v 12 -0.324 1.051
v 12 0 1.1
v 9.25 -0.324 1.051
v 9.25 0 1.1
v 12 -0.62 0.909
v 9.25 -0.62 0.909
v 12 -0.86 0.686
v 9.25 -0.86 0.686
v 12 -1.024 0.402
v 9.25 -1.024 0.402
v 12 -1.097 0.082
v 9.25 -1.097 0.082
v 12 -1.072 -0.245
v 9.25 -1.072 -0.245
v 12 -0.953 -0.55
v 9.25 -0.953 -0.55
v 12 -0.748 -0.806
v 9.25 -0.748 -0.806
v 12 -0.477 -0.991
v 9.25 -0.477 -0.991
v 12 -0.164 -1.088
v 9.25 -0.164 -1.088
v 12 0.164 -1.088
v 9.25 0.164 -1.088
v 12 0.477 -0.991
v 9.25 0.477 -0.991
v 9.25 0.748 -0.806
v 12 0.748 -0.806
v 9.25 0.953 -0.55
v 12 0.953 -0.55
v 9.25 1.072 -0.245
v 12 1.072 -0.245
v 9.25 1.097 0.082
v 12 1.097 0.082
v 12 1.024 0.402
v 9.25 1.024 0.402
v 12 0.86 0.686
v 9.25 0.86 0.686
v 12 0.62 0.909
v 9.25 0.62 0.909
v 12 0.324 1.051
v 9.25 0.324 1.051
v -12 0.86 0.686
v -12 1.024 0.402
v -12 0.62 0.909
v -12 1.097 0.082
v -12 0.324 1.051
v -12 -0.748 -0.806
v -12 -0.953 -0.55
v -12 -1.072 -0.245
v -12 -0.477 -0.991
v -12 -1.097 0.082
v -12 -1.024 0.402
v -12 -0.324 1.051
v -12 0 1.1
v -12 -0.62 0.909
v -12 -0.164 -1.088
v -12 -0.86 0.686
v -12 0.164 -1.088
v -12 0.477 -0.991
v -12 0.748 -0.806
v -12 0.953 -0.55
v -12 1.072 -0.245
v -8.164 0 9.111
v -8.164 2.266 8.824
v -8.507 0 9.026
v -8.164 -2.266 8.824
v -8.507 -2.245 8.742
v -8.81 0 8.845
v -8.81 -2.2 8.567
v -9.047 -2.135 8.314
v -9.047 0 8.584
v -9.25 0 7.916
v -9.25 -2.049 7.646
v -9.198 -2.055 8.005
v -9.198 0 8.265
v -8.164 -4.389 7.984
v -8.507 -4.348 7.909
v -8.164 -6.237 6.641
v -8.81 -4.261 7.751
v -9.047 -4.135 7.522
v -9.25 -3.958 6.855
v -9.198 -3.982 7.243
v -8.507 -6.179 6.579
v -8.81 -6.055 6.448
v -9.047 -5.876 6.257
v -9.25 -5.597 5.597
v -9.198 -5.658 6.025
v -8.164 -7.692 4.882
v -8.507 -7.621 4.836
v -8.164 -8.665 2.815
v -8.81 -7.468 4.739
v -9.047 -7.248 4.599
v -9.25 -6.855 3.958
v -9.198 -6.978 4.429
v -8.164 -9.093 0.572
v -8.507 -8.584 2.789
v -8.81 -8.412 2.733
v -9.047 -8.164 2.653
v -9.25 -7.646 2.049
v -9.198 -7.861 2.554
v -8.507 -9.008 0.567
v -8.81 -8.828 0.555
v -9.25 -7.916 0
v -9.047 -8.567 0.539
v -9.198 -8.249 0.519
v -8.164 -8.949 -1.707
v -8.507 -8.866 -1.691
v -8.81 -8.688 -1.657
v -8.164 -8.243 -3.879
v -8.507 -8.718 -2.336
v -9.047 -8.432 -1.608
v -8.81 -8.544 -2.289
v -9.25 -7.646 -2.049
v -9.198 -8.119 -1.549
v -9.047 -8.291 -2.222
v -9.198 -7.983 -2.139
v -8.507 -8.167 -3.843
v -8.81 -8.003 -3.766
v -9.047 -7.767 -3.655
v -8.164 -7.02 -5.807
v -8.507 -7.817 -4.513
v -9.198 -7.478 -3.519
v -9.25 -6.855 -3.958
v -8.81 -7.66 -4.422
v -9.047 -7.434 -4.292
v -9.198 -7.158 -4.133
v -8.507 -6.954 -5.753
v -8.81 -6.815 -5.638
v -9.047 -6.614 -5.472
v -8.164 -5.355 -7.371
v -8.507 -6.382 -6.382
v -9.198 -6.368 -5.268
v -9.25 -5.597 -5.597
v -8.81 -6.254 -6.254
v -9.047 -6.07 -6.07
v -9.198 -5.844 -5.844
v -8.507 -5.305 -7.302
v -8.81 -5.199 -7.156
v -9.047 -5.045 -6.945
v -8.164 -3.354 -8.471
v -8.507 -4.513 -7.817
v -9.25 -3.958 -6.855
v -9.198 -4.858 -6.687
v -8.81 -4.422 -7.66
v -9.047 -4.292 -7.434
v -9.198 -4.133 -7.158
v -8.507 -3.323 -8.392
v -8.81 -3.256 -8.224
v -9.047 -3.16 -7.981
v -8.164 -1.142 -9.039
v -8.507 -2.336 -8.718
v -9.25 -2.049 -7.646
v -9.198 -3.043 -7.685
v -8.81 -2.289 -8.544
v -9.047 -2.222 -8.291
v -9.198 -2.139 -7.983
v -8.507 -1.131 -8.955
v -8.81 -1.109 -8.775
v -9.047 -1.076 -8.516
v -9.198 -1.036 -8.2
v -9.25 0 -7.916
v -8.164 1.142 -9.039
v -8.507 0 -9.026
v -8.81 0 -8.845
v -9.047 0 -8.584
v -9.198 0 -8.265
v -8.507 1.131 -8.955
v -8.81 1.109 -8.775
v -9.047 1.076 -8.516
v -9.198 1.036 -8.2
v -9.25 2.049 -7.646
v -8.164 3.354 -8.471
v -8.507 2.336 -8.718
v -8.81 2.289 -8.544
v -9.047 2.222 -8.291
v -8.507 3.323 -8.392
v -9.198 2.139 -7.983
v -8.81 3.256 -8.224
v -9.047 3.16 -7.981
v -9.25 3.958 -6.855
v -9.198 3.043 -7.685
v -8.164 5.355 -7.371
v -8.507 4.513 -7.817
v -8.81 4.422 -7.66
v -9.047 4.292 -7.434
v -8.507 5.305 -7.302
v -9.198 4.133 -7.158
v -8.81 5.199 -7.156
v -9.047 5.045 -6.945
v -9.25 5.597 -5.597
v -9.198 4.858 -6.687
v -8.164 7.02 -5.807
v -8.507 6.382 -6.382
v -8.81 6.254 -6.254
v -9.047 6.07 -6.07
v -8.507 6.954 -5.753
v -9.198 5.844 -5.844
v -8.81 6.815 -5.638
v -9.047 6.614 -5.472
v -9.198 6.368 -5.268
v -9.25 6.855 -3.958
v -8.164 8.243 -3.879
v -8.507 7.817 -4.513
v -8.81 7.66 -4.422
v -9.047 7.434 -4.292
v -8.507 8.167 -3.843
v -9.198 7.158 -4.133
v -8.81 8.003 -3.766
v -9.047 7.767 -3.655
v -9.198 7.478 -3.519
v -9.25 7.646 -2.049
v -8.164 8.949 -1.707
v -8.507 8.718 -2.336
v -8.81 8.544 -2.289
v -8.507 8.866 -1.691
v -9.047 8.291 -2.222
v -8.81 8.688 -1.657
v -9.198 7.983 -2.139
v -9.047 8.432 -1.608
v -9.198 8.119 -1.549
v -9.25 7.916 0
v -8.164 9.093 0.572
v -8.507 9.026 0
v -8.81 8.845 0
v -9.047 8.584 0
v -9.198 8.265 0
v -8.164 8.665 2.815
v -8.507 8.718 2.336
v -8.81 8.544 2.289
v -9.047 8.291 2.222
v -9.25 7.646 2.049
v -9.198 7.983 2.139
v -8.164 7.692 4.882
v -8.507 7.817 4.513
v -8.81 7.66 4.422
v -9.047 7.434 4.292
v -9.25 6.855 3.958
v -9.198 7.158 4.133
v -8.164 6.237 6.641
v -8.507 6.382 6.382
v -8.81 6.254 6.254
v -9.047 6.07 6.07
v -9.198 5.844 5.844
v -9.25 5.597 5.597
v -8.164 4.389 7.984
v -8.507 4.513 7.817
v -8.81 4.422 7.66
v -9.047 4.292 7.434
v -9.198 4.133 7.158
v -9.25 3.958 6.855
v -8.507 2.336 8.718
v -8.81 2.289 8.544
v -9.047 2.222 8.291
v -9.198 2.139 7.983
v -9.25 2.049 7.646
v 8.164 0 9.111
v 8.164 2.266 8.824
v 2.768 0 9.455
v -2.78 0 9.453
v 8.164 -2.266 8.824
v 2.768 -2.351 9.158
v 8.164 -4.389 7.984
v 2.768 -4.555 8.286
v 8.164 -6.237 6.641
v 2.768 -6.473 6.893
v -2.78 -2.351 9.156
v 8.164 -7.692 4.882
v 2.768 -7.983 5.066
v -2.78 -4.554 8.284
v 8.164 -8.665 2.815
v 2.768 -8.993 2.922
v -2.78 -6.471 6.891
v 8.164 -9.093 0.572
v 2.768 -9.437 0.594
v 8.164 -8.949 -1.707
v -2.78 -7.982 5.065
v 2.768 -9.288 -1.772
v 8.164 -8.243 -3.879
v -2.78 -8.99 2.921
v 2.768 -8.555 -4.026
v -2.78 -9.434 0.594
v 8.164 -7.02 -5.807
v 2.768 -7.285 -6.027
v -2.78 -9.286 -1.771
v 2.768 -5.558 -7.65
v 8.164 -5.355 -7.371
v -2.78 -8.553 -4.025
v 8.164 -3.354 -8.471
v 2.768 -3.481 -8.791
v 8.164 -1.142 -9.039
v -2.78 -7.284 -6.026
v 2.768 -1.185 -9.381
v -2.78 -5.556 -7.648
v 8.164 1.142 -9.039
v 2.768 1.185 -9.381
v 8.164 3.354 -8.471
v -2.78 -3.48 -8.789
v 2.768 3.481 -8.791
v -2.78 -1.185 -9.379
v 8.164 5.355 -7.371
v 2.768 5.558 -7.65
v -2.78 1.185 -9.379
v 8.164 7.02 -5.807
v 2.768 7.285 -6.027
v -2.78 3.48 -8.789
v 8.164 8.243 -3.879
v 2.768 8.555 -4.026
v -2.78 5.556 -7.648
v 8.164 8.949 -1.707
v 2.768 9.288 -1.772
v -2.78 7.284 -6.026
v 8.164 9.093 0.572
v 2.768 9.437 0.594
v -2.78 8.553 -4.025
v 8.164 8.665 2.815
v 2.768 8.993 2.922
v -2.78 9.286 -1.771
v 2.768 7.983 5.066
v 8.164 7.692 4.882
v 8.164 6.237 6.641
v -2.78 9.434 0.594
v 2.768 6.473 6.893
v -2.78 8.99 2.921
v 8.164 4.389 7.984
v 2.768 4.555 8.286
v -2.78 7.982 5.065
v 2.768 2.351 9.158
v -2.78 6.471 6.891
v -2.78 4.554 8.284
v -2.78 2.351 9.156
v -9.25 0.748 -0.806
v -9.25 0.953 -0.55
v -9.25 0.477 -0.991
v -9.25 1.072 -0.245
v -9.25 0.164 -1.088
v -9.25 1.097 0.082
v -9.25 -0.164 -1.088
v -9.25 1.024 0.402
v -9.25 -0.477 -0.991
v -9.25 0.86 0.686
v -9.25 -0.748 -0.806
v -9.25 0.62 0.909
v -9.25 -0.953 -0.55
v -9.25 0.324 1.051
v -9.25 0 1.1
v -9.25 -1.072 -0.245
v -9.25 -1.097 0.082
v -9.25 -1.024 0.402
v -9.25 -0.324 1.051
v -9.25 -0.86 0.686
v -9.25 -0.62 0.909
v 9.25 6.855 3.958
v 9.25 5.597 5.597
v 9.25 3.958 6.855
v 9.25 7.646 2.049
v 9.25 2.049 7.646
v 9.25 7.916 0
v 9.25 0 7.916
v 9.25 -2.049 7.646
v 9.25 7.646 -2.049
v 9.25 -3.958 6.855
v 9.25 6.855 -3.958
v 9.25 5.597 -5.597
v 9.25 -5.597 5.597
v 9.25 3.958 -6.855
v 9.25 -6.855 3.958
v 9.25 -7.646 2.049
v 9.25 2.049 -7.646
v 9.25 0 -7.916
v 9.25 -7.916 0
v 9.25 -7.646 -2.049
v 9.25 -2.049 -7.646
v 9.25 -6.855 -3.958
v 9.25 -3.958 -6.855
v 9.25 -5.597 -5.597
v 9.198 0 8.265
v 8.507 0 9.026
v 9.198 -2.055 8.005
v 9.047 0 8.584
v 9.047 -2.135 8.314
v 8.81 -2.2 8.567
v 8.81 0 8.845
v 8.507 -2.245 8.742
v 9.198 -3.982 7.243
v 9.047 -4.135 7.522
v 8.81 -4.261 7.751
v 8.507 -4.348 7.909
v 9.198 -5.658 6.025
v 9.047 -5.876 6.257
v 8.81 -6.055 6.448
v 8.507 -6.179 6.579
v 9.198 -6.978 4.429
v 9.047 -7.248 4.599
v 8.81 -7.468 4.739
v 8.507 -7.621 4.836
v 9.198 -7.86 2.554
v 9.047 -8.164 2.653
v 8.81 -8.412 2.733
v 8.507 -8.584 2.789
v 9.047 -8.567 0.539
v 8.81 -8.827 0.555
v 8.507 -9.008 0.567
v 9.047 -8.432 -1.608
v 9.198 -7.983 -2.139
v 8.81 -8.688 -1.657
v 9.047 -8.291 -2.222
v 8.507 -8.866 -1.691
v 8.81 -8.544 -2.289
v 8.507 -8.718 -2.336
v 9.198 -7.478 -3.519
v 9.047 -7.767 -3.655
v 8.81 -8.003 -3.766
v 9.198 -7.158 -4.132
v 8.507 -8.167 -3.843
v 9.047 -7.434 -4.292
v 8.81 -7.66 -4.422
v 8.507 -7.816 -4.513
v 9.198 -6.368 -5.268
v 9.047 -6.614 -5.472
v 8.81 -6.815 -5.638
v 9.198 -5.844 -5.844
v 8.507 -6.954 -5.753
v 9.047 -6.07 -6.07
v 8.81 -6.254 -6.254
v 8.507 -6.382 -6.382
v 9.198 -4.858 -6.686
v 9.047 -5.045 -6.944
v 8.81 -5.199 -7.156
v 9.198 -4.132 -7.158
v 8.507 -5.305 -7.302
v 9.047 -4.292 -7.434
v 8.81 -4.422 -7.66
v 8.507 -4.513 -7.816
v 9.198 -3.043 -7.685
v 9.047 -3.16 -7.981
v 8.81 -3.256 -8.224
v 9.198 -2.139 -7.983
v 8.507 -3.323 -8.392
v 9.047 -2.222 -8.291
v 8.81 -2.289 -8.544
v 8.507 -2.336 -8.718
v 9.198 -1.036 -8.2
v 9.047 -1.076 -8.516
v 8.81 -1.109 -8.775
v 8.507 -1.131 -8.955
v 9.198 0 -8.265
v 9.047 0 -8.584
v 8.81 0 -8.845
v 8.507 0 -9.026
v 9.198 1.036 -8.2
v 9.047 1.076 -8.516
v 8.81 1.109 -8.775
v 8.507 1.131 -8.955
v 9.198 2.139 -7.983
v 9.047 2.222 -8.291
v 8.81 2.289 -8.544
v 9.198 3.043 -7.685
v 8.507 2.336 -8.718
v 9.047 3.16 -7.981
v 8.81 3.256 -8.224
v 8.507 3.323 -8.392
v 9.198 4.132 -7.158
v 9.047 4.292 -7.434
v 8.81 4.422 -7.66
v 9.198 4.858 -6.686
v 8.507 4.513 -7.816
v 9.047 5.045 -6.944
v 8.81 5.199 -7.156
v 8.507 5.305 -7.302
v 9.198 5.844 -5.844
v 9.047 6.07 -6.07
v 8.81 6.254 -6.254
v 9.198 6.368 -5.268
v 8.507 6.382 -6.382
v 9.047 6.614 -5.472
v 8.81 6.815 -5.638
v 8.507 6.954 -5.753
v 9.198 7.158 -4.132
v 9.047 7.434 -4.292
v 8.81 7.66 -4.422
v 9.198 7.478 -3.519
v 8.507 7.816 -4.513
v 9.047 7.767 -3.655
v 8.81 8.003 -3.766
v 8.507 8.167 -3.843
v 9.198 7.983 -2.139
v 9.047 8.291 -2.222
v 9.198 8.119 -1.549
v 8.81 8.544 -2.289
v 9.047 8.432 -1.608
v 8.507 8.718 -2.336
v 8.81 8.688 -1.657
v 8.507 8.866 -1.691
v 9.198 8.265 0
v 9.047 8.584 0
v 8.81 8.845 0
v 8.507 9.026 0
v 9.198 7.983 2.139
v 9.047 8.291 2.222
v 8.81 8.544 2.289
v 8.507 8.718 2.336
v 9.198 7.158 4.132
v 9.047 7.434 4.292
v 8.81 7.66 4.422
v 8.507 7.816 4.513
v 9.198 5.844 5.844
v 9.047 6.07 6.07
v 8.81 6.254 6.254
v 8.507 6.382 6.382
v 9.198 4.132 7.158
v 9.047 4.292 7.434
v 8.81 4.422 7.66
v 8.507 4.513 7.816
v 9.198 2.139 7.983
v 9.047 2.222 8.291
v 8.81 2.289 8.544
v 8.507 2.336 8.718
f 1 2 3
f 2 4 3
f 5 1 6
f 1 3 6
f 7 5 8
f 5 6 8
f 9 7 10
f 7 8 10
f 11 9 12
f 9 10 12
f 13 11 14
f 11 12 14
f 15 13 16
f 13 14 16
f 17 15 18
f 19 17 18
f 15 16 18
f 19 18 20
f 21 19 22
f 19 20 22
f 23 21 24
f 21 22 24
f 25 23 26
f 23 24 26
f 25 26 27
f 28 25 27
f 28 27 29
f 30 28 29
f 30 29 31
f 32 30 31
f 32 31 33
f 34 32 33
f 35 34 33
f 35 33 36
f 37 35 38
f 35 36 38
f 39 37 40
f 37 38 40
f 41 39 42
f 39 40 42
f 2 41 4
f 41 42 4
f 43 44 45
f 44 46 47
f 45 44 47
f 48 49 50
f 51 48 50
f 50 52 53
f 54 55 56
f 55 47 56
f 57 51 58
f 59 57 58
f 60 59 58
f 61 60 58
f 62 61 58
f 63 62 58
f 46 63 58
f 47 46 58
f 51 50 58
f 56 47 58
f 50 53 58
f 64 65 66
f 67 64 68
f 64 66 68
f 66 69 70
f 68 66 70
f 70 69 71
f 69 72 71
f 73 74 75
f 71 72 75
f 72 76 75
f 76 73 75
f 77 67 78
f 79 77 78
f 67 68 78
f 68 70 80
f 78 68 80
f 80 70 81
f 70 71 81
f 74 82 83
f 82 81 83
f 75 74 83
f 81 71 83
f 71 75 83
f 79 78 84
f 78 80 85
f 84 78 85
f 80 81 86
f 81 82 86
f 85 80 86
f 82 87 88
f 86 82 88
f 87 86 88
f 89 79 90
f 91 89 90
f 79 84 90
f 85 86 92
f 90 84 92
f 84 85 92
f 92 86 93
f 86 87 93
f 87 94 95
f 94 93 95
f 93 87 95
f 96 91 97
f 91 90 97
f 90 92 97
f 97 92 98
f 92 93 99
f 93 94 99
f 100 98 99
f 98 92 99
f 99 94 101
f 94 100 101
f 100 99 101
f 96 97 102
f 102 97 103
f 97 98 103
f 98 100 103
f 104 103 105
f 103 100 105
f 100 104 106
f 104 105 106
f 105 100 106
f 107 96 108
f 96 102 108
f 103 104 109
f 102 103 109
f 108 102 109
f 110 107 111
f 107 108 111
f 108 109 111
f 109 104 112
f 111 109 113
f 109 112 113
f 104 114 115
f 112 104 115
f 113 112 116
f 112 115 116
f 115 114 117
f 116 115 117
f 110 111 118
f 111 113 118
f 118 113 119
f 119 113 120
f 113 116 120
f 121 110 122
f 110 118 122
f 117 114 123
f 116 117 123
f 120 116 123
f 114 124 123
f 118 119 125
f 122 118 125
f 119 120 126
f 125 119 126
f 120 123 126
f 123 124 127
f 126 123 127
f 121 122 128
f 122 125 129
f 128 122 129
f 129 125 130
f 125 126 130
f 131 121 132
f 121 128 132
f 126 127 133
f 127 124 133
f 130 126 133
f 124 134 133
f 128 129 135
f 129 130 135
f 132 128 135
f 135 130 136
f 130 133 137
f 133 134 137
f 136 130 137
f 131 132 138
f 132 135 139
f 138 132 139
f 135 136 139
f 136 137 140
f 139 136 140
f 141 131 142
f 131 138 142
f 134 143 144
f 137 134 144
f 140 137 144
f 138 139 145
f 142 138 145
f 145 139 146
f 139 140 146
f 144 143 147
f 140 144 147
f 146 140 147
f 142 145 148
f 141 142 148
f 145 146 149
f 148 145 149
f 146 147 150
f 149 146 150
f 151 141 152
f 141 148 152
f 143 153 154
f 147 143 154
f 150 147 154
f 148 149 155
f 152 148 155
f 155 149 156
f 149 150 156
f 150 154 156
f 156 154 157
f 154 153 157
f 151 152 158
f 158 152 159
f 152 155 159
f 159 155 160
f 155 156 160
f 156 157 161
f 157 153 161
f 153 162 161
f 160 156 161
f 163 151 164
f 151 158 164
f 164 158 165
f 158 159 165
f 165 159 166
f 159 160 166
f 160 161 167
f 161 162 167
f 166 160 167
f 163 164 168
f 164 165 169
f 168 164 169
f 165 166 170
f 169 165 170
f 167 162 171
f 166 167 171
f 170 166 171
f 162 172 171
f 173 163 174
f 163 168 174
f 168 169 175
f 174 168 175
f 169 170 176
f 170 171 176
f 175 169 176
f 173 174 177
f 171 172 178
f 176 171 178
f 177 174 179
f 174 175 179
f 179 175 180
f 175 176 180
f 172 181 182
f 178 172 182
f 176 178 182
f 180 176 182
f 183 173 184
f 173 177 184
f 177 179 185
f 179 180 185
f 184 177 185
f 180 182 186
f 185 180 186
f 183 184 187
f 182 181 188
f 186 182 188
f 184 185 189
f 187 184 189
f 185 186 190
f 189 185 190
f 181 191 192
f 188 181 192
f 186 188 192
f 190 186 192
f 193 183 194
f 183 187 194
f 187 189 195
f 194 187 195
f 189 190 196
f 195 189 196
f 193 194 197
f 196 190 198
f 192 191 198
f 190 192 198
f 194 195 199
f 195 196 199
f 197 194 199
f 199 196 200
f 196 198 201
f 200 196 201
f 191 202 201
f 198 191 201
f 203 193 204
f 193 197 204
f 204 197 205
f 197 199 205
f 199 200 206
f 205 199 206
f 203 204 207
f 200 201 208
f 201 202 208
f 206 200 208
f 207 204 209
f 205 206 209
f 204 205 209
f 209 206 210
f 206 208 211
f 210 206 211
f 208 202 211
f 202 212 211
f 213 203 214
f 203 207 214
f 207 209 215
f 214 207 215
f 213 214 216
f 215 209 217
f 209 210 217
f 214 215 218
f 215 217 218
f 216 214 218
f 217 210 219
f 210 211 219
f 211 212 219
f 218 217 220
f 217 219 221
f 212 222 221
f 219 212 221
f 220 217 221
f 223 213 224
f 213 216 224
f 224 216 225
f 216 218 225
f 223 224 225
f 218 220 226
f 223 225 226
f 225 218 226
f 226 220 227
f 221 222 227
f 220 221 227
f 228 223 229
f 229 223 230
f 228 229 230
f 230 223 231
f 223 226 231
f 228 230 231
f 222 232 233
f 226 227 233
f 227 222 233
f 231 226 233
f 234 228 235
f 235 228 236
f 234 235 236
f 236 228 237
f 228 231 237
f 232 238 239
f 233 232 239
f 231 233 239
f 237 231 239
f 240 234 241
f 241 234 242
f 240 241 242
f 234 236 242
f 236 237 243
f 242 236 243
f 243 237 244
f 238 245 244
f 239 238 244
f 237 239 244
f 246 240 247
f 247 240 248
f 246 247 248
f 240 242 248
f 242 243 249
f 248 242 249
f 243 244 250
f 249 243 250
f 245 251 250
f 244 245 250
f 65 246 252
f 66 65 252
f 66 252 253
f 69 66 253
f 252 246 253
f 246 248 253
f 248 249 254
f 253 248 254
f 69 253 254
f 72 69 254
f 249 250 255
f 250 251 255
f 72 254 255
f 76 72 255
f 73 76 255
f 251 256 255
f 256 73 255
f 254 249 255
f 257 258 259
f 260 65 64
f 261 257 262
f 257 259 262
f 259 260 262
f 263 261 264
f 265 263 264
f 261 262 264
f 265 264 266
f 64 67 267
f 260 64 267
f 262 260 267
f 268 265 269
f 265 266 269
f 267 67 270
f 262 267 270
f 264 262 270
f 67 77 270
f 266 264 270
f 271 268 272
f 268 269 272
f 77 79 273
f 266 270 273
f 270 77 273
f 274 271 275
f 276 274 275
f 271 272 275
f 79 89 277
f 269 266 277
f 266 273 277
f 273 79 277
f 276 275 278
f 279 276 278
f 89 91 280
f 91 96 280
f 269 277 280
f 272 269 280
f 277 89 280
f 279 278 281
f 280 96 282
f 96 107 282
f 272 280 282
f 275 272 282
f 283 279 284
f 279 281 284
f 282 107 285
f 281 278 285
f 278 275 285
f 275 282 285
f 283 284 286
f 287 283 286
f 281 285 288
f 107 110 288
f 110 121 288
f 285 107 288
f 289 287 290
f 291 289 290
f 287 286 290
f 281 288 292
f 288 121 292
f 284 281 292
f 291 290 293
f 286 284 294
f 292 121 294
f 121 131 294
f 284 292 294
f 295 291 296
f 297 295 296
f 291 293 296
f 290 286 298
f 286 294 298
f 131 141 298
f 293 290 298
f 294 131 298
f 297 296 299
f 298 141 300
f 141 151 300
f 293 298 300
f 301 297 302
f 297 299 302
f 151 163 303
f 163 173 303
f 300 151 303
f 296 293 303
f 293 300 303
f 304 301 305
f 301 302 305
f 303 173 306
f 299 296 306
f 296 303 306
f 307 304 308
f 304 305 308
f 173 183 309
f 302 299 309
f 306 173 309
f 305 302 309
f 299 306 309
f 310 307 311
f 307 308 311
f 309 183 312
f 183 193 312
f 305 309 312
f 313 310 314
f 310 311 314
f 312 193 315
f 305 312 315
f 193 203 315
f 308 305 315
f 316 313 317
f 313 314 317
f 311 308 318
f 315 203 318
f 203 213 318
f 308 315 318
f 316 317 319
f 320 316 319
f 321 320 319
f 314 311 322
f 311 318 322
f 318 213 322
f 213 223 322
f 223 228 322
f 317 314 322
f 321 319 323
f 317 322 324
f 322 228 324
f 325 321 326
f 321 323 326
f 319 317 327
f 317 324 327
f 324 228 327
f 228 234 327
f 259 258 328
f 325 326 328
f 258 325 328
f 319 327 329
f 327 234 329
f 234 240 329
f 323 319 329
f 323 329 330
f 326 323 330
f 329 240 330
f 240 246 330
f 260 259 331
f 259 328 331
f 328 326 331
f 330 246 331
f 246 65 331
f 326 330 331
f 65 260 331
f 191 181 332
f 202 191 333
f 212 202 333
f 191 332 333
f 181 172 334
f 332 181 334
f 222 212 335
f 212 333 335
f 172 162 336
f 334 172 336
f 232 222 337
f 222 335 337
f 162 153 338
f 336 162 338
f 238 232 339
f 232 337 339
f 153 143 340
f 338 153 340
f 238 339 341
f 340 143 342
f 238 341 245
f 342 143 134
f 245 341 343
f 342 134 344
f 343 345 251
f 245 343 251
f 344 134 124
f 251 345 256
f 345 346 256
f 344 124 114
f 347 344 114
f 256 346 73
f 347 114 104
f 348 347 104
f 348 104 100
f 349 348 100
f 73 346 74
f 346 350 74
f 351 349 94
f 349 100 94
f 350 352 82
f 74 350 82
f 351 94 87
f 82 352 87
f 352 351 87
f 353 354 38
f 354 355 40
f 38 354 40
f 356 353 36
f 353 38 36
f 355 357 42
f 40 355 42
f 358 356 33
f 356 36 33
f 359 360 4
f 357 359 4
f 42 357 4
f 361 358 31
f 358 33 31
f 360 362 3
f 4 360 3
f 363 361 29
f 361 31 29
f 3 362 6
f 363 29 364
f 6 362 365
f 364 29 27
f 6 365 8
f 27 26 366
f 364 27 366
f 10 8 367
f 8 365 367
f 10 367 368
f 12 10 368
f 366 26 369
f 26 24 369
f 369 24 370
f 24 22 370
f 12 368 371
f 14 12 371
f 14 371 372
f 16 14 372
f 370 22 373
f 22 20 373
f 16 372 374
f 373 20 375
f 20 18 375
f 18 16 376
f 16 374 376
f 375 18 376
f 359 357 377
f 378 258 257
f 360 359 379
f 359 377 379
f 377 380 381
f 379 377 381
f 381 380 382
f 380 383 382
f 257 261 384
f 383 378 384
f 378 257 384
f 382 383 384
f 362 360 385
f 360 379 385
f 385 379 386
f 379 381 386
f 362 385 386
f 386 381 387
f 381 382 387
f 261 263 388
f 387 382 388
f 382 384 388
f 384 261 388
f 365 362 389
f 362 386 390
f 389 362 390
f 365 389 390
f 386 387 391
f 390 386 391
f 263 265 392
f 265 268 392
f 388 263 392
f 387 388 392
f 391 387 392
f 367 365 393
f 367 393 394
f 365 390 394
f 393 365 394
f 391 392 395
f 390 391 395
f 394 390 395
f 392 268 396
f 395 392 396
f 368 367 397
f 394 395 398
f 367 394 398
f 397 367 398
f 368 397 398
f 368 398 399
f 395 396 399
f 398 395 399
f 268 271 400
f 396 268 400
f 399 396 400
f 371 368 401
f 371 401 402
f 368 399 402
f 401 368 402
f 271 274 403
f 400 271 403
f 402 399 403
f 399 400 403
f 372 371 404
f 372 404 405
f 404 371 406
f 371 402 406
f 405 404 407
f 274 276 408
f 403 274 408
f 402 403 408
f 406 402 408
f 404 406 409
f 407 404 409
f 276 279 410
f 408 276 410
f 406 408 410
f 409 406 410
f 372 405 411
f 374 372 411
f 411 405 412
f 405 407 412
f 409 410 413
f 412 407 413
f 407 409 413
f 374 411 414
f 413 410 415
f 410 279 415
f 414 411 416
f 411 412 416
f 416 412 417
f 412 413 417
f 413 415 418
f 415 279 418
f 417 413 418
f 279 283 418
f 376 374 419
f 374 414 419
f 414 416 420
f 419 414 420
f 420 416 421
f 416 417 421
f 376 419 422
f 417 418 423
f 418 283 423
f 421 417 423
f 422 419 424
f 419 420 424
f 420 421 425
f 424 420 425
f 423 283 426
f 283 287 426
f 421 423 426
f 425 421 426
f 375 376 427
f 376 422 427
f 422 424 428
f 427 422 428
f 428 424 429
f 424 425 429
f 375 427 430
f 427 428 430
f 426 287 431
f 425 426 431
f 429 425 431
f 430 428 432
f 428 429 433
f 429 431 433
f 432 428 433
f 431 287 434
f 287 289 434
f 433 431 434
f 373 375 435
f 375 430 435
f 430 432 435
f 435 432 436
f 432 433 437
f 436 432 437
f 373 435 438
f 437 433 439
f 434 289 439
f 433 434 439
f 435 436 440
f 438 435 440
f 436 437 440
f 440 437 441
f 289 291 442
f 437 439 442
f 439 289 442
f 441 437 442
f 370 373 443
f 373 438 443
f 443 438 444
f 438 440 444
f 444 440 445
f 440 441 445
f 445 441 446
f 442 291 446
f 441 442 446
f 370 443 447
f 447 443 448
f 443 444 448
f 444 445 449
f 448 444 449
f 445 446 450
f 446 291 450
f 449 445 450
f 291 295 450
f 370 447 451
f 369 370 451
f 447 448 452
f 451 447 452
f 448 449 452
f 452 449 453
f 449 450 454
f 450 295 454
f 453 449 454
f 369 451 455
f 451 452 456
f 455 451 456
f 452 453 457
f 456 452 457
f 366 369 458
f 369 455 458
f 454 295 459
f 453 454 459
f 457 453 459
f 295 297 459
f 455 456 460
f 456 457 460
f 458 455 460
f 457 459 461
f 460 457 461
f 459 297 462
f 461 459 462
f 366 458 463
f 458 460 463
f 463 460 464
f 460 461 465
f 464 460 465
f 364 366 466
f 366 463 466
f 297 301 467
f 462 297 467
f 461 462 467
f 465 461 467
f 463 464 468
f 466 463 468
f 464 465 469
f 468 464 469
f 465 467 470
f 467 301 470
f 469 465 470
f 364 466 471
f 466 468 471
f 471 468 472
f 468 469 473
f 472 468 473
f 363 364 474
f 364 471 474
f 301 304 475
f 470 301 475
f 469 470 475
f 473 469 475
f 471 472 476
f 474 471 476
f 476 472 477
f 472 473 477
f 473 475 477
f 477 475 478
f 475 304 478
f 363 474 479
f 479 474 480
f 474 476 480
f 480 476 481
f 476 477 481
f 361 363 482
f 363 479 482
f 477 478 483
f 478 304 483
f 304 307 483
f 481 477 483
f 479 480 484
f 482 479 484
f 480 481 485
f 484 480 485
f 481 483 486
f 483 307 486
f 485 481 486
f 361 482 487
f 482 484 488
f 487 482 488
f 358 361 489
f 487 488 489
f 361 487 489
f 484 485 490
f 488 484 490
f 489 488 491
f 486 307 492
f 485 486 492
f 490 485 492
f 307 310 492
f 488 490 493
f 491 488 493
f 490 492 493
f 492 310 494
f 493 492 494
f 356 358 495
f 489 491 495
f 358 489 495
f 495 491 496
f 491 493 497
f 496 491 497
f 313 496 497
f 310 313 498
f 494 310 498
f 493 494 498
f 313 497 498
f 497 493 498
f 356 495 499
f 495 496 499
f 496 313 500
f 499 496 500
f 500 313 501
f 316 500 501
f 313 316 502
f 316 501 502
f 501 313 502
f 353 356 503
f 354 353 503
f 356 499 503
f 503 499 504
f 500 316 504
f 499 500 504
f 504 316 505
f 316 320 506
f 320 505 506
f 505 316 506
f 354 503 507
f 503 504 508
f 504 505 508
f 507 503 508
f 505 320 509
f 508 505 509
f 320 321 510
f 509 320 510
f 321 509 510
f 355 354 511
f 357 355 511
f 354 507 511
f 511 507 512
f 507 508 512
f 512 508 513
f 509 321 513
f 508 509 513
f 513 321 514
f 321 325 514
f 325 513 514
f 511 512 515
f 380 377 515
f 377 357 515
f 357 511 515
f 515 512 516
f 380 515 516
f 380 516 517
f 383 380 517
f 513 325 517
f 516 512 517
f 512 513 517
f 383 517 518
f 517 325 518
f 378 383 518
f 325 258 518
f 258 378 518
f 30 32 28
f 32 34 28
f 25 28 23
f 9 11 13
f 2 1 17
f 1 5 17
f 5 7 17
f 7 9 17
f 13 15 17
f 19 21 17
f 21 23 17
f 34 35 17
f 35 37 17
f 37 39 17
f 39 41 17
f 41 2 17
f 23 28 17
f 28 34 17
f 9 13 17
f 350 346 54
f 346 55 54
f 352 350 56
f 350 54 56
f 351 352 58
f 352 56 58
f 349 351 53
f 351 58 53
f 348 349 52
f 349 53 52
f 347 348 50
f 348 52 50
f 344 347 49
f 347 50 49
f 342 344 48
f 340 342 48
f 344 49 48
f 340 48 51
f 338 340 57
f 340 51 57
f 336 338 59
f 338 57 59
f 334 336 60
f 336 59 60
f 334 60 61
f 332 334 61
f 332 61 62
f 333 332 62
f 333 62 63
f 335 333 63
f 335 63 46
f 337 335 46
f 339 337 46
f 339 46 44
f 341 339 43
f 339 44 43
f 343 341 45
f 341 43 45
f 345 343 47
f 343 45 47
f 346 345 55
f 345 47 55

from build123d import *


with BuildPart() as part:
    # 草图1 → 旋转1 (revolve)
    with BuildSketch(Plane(origin=(0, 0, 0), x_dir=(1, 0, 0), z_dir=(0, 1, 0)), mode=Mode.PRIVATE) as revolve_1_sk:
        with BuildLine():
            Line((-12, 0), (12, 0))
            Line((12, 0), (12, 1.1))
            Line((12, 1.1), (9.25, 1.1))
            Line((9.25, 1.1), (9.25, 7.915940664))
            ThreePointArc((9.25, 7.915940664), (8.937946411, 8.723127861), (8.164081381, 9.110505622))
            add(Edge.make_bspline(
                [(8.164081381, 9.110505622), (5.535370052, 9.361548494), (0.026154039, 9.640968889), (-5.587611319, 9.356513757), (-8.164031617, 9.110573004)],
                knots=[0.05870374, 0.05870374, 0.05870374, 0.05870374, 0.499984959, 0.941263527, 0.941263527, 0.941263527, 0.941263527], degree=3))
            ThreePointArc((-8.164031617, 9.110573004), (-8.937929598, 8.723208987), (-9.25, 7.916003295))
            Line((-9.25, 7.916003295), (-9.25, 1.1))
            Line((-9.25, 1.1), (-12, 1.1))
            Line((-12, 1.1), (-12, 0))
        make_face()
    revolve(revolve_1_sk.sketch.rotate(Axis((-12, 0, 0), (1, 0, 0)), 180), axis=Axis((-12, 0, 0), (1, 0, 0)))


solid = part.part
